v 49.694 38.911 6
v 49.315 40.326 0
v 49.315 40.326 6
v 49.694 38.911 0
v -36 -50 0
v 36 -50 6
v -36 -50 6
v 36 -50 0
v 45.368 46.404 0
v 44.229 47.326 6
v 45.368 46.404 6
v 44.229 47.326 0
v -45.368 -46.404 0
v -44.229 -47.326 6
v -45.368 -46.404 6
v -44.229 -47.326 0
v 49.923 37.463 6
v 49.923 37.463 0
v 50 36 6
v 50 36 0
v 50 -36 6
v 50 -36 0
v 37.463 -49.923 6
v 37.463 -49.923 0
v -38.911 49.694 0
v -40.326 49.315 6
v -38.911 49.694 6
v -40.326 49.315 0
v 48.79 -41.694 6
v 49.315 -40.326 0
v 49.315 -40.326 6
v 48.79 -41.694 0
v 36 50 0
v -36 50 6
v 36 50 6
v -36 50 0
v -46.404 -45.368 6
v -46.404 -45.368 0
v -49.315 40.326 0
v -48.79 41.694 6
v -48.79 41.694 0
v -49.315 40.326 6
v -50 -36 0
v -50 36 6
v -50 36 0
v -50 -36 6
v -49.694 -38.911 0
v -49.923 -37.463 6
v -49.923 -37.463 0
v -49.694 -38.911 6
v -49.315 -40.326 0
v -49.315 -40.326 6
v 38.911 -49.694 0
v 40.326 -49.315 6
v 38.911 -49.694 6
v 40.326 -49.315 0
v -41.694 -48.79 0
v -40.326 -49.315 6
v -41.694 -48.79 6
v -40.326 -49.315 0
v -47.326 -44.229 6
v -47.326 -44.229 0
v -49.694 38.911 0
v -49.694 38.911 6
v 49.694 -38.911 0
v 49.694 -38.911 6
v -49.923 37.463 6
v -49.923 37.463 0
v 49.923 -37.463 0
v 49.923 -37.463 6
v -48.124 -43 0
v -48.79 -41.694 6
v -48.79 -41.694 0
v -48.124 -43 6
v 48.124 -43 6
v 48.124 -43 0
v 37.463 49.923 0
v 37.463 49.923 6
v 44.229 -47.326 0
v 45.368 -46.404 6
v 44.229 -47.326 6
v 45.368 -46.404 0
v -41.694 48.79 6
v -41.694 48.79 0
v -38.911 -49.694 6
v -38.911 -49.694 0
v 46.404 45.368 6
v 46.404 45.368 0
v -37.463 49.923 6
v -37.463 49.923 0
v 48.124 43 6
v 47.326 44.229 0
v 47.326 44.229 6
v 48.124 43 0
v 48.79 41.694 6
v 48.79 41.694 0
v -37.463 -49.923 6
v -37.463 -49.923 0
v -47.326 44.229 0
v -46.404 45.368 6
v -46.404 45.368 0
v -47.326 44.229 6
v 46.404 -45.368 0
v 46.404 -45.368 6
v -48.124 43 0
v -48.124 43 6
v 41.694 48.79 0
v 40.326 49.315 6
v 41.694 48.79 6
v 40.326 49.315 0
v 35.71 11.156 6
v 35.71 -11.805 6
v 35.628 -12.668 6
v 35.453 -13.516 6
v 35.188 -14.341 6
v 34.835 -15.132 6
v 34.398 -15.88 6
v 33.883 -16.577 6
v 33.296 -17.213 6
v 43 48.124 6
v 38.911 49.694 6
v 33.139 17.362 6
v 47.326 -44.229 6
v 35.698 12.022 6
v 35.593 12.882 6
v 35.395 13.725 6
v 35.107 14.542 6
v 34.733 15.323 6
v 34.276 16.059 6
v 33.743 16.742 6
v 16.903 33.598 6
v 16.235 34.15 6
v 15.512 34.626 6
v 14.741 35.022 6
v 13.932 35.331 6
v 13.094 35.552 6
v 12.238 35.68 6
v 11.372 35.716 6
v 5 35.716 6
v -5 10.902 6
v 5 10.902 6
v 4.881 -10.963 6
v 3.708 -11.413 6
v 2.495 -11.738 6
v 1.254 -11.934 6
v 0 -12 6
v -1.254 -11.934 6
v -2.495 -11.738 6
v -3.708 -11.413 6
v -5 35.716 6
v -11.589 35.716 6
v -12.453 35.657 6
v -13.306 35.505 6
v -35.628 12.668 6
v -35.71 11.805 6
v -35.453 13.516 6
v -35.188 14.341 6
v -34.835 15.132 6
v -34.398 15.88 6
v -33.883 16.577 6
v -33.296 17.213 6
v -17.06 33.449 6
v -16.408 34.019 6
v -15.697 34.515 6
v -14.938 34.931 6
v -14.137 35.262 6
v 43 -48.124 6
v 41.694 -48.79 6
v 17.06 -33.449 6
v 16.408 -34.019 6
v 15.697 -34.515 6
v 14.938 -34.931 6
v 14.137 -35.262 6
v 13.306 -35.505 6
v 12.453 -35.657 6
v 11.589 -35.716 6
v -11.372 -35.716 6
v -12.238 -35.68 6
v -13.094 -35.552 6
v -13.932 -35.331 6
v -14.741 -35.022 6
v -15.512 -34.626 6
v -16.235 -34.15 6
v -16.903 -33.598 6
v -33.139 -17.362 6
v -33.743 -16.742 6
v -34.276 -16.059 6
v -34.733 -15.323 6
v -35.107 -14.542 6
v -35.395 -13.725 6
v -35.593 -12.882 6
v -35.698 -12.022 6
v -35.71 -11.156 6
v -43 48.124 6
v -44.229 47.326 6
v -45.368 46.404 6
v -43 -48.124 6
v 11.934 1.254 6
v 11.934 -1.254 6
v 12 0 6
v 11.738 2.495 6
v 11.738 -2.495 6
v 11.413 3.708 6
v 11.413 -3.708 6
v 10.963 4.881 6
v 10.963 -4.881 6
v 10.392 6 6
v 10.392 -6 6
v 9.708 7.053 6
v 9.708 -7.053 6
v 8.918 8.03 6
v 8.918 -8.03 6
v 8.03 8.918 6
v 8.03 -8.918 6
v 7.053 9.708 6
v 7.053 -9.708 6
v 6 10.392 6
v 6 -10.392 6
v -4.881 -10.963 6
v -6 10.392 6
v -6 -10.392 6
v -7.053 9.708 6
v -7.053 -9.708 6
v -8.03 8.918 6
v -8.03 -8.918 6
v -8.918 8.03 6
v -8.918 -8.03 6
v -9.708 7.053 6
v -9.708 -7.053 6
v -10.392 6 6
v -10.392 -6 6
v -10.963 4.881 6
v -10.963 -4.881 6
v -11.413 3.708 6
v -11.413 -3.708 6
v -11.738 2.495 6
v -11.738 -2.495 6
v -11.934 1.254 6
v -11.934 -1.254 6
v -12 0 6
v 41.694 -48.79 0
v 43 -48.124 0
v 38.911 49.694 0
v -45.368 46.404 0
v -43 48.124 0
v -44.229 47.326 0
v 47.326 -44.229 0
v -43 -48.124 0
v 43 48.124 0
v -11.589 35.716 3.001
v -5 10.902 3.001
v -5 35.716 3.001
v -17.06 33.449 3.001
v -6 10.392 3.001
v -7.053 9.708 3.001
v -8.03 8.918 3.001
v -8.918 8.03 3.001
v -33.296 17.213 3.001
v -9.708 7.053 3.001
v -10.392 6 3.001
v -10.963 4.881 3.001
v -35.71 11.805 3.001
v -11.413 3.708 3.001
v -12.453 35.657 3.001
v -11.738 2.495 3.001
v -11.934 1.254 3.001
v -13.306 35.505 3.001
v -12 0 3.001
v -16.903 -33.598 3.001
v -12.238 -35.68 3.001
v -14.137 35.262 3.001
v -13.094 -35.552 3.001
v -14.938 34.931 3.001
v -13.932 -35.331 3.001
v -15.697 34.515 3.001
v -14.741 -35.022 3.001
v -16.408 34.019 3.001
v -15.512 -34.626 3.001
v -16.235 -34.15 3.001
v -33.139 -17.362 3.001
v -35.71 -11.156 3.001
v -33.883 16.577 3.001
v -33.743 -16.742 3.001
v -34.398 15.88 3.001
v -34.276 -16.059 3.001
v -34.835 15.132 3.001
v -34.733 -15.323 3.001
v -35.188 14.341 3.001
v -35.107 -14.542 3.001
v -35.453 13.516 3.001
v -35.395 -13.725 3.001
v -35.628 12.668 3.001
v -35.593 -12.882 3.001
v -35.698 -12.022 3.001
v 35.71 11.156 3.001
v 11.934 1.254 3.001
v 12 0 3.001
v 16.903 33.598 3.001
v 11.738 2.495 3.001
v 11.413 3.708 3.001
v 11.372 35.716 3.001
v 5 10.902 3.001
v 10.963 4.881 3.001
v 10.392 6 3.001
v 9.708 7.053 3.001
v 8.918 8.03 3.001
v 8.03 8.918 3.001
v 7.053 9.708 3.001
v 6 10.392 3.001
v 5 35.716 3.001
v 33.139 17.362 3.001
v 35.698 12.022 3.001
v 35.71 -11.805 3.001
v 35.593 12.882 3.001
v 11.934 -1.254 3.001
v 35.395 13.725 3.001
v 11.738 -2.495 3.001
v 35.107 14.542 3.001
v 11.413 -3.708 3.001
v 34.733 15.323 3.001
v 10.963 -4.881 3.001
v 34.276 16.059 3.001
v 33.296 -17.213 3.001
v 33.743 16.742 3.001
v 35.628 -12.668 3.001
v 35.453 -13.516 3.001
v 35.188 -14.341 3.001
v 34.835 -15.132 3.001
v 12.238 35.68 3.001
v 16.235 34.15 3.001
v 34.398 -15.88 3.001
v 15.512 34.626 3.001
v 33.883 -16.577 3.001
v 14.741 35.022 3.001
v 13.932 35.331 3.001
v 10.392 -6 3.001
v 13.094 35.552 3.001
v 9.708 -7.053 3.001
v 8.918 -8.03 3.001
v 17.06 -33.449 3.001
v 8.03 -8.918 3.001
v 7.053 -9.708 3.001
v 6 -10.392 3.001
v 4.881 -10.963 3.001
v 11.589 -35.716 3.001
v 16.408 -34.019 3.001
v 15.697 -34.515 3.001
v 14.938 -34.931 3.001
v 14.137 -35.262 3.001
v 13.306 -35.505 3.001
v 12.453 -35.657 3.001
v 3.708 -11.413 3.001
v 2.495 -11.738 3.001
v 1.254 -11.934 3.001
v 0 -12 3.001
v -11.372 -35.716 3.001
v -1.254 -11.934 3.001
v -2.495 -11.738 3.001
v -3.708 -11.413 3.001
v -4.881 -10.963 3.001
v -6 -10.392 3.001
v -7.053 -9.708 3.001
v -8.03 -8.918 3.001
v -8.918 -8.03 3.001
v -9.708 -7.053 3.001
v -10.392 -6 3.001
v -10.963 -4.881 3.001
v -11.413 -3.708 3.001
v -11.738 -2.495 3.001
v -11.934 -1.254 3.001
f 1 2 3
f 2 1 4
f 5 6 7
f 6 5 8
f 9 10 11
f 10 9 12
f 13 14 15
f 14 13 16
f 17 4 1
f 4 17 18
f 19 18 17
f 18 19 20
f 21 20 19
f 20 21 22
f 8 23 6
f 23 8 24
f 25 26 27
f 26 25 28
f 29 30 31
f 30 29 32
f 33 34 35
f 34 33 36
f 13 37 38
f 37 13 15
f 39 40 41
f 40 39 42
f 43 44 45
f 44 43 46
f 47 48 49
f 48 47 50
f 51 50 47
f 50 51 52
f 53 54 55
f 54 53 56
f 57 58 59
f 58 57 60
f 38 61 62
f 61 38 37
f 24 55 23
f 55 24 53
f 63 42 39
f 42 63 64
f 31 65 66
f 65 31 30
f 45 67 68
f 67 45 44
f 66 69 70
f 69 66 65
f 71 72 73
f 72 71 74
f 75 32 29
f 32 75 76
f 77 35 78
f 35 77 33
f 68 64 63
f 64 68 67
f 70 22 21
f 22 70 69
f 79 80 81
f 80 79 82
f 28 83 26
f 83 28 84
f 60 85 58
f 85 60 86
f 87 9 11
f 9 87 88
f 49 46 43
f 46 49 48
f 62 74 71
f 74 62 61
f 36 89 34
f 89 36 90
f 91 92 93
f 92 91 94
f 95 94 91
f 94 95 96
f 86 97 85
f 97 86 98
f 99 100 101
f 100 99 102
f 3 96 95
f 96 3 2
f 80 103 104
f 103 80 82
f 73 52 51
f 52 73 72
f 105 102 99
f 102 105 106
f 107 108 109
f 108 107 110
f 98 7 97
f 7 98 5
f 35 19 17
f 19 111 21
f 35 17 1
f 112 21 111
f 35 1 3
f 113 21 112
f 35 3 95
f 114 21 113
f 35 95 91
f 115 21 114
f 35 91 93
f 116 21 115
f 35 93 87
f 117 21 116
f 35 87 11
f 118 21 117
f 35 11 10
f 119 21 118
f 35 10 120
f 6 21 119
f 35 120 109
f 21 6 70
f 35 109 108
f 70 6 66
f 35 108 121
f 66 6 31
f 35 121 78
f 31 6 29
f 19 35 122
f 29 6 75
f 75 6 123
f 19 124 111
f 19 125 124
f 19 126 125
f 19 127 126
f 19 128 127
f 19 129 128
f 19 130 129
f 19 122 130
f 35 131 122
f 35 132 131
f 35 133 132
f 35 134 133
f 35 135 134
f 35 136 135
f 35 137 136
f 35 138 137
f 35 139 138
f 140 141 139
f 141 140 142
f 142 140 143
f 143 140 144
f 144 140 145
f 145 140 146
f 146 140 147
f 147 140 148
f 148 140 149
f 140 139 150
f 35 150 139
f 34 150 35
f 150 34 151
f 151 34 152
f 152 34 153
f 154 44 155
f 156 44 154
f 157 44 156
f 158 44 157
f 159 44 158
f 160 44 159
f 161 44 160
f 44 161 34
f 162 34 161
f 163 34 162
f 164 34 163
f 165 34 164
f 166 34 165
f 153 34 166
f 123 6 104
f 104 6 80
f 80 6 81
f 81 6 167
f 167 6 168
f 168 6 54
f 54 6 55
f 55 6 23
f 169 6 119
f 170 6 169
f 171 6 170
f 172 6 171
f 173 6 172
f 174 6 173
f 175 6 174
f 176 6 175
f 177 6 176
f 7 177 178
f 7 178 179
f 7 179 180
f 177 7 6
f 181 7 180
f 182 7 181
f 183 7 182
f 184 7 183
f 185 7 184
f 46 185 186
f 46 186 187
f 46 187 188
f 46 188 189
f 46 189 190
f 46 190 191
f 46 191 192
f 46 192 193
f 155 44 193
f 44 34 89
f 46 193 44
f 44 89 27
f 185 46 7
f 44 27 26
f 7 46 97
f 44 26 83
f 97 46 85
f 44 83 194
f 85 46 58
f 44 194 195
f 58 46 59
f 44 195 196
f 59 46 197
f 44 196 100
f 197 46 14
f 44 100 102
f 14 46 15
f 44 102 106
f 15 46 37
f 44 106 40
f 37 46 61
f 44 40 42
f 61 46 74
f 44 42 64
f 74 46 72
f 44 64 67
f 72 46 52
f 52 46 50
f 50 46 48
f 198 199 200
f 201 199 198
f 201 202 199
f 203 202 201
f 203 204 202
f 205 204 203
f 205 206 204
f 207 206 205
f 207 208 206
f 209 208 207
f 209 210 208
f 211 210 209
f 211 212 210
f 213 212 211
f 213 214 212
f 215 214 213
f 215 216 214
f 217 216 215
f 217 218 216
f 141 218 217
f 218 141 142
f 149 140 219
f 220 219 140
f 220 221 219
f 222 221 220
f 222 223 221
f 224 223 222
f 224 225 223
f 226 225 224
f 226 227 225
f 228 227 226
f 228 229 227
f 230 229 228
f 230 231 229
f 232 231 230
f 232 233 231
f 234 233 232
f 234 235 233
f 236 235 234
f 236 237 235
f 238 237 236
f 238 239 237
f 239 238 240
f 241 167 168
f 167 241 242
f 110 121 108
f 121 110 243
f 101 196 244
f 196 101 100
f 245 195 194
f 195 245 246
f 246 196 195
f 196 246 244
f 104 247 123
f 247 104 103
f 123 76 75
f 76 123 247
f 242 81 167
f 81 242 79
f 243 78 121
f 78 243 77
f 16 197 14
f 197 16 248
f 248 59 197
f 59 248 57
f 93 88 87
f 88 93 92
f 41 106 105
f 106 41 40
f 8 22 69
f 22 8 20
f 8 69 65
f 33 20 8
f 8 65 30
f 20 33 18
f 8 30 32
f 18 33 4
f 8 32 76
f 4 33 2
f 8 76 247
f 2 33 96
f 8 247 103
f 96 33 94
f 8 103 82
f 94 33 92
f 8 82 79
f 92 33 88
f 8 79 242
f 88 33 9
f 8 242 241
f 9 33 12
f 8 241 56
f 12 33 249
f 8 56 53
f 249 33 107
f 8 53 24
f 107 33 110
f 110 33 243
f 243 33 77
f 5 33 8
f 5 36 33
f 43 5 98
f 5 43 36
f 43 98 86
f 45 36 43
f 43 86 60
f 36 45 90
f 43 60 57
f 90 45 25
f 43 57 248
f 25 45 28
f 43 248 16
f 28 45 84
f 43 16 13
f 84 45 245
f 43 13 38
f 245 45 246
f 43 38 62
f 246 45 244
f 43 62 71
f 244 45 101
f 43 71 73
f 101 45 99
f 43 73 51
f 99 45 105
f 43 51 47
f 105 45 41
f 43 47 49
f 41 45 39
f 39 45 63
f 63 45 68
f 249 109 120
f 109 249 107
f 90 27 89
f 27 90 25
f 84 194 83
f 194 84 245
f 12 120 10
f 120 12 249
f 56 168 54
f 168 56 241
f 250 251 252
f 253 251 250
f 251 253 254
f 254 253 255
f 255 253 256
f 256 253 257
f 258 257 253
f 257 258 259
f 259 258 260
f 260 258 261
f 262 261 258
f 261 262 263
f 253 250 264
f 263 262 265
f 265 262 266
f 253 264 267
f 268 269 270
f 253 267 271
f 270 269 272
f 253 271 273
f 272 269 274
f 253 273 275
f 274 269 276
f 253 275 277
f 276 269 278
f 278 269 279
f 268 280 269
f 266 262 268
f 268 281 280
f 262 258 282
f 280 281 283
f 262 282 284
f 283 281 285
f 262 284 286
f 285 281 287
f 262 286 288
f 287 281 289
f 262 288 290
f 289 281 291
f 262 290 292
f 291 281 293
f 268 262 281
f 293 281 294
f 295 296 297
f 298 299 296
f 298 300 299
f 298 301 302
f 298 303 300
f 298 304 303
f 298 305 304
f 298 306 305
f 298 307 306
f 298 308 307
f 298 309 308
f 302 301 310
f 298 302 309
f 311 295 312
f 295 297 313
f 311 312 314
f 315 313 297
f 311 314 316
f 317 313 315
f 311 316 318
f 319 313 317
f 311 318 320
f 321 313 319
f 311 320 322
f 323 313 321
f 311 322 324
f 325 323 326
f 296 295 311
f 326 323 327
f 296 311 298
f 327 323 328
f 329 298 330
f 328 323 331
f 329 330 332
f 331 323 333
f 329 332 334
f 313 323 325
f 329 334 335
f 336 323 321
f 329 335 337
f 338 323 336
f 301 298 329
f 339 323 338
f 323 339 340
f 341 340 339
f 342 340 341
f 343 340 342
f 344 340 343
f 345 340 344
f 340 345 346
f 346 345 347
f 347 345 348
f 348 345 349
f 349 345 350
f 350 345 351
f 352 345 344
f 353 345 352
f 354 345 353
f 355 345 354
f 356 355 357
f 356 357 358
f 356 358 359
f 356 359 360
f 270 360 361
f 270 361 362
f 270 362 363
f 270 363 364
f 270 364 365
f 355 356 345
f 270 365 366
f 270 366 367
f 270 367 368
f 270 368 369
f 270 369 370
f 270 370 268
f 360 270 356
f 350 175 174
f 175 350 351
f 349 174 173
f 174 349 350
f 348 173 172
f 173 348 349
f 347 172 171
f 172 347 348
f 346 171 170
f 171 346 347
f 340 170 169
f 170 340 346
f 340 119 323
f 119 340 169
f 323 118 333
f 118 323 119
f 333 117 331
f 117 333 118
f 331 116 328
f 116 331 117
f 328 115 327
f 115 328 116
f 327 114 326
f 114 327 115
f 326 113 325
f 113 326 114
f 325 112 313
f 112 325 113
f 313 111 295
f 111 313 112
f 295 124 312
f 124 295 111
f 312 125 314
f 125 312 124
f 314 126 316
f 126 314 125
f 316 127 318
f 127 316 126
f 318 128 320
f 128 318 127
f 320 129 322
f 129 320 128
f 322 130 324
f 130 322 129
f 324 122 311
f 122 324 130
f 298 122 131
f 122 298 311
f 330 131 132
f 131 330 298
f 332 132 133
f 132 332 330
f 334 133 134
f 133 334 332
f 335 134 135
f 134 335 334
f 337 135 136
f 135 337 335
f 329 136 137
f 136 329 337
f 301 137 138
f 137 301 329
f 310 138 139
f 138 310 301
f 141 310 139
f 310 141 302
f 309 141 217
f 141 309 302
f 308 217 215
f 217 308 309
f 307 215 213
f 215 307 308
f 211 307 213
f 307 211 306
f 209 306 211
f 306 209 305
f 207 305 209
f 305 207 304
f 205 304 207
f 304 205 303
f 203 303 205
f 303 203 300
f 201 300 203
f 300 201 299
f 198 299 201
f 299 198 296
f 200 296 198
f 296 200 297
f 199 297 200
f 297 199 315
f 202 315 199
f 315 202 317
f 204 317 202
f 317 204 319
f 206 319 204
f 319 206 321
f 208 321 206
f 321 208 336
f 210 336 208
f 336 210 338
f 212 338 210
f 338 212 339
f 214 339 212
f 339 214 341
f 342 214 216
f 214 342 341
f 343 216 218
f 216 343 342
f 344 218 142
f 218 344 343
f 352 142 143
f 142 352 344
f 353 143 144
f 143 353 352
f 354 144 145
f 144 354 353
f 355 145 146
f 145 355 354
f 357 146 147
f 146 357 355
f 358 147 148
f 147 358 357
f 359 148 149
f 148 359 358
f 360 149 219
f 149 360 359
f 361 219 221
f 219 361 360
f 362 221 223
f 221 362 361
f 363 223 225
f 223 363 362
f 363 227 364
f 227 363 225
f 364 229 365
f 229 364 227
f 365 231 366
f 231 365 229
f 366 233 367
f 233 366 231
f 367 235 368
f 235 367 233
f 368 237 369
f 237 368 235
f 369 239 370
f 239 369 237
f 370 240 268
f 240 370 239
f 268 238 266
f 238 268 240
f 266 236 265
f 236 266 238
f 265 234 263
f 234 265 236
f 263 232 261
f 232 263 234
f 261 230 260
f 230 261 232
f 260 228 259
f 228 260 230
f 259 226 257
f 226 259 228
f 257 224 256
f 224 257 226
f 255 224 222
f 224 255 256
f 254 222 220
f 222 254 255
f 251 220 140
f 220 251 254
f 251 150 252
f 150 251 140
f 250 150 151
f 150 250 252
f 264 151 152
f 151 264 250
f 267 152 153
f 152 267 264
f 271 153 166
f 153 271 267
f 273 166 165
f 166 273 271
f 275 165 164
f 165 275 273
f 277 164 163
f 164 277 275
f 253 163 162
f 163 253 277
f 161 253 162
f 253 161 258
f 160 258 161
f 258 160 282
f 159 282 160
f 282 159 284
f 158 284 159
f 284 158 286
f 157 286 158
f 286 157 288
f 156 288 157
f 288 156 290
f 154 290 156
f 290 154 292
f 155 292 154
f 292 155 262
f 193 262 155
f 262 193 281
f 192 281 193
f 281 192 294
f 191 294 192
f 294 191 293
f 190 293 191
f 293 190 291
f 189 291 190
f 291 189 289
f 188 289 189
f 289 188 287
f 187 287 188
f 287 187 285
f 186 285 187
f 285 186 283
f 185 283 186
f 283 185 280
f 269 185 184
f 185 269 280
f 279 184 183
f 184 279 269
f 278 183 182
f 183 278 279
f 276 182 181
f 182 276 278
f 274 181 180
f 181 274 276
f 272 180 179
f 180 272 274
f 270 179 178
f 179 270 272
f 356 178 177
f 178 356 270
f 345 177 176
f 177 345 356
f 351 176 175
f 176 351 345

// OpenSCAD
// file: coaster_lib.scad
$fa = 6;
$fs = 0.875;

module coaster_base_3d(size, thickness, border_radius) {
    linear_extrude(height = thickness) {
        minkowski() {
            cube_size = size - border_radius * 2;

            square(size = [cube_size, cube_size], center = true);
            circle(r = border_radius);
        }
    }
}

module epayslips_logo_2d(size) {
    difference() {
        rotate(a = 45)
        minkowski() {
            roundness = 22;
            cube_size = size * 0.5 - roundness;

            square(size = [cube_size, cube_size], center = true);
            circle(r = roundness);
        }

        minkowski() {
            roundness = 10;
            cube_size = size * 0.25 - roundness;

            square(size = [cube_size, cube_size], center = true);
            circle(r = roundness);
        }
    }
}

module datacode_logo_2d(size) {
    difference() {
        rotate(a = 45 / 2)
        minkowski() {
            roundness = 8;
            circle(r = size * 0.38 - roundness, $fn = 8);
            circle(r = roundness);
        }

        circle(r = size * 0.12);

        translate([0, size / 4, 0]) {
            square(size = [size * 0.1, size / 2], center = true);
        }
    }
}

module sj_logo_2d(size) {
    rotate(a = 45 / 2)
    difference() {
        roundness = 8;

        minkowski() {
            circle(r = size * 0.45 - roundness, $fn = 8);
            circle(r = roundness);
        }

        minkowski() {
            circle(r = size * 0.385 - roundness, $fn = 8);
            circle(r = roundness);
        }
    }

    text_size = size * 0.2;
    text_offset = text_size / 2 + 2;

    translate([0, text_offset, 0])
    text(
        text = "JAC",
        halign = "center",
        valign = "center",
        font = "Roboto Mono for Powerline:style=Bold",
        size = size * 0.2
    );

    translate([0, -text_offset, 0])
    text(
        text = "UZI",
        halign = "center",
        valign = "center",
        font = "Roboto Mono for Powerline:style=Bold",
        size = size * 0.2
    );
}
// main file
include<coaster_lib.scad>;

$fa = 6;
$fs = 0.875;

size = 100;
border_radius = 14;
thickness = 6;

difference() {
    coaster_base_3d(size, thickness, border_radius);

    translate([0, 0, thickness / 2 + 0.001]) {
        linear_extrude(height = thickness / 2) {
            datacode_logo_2d(size);
        }
    }
}
